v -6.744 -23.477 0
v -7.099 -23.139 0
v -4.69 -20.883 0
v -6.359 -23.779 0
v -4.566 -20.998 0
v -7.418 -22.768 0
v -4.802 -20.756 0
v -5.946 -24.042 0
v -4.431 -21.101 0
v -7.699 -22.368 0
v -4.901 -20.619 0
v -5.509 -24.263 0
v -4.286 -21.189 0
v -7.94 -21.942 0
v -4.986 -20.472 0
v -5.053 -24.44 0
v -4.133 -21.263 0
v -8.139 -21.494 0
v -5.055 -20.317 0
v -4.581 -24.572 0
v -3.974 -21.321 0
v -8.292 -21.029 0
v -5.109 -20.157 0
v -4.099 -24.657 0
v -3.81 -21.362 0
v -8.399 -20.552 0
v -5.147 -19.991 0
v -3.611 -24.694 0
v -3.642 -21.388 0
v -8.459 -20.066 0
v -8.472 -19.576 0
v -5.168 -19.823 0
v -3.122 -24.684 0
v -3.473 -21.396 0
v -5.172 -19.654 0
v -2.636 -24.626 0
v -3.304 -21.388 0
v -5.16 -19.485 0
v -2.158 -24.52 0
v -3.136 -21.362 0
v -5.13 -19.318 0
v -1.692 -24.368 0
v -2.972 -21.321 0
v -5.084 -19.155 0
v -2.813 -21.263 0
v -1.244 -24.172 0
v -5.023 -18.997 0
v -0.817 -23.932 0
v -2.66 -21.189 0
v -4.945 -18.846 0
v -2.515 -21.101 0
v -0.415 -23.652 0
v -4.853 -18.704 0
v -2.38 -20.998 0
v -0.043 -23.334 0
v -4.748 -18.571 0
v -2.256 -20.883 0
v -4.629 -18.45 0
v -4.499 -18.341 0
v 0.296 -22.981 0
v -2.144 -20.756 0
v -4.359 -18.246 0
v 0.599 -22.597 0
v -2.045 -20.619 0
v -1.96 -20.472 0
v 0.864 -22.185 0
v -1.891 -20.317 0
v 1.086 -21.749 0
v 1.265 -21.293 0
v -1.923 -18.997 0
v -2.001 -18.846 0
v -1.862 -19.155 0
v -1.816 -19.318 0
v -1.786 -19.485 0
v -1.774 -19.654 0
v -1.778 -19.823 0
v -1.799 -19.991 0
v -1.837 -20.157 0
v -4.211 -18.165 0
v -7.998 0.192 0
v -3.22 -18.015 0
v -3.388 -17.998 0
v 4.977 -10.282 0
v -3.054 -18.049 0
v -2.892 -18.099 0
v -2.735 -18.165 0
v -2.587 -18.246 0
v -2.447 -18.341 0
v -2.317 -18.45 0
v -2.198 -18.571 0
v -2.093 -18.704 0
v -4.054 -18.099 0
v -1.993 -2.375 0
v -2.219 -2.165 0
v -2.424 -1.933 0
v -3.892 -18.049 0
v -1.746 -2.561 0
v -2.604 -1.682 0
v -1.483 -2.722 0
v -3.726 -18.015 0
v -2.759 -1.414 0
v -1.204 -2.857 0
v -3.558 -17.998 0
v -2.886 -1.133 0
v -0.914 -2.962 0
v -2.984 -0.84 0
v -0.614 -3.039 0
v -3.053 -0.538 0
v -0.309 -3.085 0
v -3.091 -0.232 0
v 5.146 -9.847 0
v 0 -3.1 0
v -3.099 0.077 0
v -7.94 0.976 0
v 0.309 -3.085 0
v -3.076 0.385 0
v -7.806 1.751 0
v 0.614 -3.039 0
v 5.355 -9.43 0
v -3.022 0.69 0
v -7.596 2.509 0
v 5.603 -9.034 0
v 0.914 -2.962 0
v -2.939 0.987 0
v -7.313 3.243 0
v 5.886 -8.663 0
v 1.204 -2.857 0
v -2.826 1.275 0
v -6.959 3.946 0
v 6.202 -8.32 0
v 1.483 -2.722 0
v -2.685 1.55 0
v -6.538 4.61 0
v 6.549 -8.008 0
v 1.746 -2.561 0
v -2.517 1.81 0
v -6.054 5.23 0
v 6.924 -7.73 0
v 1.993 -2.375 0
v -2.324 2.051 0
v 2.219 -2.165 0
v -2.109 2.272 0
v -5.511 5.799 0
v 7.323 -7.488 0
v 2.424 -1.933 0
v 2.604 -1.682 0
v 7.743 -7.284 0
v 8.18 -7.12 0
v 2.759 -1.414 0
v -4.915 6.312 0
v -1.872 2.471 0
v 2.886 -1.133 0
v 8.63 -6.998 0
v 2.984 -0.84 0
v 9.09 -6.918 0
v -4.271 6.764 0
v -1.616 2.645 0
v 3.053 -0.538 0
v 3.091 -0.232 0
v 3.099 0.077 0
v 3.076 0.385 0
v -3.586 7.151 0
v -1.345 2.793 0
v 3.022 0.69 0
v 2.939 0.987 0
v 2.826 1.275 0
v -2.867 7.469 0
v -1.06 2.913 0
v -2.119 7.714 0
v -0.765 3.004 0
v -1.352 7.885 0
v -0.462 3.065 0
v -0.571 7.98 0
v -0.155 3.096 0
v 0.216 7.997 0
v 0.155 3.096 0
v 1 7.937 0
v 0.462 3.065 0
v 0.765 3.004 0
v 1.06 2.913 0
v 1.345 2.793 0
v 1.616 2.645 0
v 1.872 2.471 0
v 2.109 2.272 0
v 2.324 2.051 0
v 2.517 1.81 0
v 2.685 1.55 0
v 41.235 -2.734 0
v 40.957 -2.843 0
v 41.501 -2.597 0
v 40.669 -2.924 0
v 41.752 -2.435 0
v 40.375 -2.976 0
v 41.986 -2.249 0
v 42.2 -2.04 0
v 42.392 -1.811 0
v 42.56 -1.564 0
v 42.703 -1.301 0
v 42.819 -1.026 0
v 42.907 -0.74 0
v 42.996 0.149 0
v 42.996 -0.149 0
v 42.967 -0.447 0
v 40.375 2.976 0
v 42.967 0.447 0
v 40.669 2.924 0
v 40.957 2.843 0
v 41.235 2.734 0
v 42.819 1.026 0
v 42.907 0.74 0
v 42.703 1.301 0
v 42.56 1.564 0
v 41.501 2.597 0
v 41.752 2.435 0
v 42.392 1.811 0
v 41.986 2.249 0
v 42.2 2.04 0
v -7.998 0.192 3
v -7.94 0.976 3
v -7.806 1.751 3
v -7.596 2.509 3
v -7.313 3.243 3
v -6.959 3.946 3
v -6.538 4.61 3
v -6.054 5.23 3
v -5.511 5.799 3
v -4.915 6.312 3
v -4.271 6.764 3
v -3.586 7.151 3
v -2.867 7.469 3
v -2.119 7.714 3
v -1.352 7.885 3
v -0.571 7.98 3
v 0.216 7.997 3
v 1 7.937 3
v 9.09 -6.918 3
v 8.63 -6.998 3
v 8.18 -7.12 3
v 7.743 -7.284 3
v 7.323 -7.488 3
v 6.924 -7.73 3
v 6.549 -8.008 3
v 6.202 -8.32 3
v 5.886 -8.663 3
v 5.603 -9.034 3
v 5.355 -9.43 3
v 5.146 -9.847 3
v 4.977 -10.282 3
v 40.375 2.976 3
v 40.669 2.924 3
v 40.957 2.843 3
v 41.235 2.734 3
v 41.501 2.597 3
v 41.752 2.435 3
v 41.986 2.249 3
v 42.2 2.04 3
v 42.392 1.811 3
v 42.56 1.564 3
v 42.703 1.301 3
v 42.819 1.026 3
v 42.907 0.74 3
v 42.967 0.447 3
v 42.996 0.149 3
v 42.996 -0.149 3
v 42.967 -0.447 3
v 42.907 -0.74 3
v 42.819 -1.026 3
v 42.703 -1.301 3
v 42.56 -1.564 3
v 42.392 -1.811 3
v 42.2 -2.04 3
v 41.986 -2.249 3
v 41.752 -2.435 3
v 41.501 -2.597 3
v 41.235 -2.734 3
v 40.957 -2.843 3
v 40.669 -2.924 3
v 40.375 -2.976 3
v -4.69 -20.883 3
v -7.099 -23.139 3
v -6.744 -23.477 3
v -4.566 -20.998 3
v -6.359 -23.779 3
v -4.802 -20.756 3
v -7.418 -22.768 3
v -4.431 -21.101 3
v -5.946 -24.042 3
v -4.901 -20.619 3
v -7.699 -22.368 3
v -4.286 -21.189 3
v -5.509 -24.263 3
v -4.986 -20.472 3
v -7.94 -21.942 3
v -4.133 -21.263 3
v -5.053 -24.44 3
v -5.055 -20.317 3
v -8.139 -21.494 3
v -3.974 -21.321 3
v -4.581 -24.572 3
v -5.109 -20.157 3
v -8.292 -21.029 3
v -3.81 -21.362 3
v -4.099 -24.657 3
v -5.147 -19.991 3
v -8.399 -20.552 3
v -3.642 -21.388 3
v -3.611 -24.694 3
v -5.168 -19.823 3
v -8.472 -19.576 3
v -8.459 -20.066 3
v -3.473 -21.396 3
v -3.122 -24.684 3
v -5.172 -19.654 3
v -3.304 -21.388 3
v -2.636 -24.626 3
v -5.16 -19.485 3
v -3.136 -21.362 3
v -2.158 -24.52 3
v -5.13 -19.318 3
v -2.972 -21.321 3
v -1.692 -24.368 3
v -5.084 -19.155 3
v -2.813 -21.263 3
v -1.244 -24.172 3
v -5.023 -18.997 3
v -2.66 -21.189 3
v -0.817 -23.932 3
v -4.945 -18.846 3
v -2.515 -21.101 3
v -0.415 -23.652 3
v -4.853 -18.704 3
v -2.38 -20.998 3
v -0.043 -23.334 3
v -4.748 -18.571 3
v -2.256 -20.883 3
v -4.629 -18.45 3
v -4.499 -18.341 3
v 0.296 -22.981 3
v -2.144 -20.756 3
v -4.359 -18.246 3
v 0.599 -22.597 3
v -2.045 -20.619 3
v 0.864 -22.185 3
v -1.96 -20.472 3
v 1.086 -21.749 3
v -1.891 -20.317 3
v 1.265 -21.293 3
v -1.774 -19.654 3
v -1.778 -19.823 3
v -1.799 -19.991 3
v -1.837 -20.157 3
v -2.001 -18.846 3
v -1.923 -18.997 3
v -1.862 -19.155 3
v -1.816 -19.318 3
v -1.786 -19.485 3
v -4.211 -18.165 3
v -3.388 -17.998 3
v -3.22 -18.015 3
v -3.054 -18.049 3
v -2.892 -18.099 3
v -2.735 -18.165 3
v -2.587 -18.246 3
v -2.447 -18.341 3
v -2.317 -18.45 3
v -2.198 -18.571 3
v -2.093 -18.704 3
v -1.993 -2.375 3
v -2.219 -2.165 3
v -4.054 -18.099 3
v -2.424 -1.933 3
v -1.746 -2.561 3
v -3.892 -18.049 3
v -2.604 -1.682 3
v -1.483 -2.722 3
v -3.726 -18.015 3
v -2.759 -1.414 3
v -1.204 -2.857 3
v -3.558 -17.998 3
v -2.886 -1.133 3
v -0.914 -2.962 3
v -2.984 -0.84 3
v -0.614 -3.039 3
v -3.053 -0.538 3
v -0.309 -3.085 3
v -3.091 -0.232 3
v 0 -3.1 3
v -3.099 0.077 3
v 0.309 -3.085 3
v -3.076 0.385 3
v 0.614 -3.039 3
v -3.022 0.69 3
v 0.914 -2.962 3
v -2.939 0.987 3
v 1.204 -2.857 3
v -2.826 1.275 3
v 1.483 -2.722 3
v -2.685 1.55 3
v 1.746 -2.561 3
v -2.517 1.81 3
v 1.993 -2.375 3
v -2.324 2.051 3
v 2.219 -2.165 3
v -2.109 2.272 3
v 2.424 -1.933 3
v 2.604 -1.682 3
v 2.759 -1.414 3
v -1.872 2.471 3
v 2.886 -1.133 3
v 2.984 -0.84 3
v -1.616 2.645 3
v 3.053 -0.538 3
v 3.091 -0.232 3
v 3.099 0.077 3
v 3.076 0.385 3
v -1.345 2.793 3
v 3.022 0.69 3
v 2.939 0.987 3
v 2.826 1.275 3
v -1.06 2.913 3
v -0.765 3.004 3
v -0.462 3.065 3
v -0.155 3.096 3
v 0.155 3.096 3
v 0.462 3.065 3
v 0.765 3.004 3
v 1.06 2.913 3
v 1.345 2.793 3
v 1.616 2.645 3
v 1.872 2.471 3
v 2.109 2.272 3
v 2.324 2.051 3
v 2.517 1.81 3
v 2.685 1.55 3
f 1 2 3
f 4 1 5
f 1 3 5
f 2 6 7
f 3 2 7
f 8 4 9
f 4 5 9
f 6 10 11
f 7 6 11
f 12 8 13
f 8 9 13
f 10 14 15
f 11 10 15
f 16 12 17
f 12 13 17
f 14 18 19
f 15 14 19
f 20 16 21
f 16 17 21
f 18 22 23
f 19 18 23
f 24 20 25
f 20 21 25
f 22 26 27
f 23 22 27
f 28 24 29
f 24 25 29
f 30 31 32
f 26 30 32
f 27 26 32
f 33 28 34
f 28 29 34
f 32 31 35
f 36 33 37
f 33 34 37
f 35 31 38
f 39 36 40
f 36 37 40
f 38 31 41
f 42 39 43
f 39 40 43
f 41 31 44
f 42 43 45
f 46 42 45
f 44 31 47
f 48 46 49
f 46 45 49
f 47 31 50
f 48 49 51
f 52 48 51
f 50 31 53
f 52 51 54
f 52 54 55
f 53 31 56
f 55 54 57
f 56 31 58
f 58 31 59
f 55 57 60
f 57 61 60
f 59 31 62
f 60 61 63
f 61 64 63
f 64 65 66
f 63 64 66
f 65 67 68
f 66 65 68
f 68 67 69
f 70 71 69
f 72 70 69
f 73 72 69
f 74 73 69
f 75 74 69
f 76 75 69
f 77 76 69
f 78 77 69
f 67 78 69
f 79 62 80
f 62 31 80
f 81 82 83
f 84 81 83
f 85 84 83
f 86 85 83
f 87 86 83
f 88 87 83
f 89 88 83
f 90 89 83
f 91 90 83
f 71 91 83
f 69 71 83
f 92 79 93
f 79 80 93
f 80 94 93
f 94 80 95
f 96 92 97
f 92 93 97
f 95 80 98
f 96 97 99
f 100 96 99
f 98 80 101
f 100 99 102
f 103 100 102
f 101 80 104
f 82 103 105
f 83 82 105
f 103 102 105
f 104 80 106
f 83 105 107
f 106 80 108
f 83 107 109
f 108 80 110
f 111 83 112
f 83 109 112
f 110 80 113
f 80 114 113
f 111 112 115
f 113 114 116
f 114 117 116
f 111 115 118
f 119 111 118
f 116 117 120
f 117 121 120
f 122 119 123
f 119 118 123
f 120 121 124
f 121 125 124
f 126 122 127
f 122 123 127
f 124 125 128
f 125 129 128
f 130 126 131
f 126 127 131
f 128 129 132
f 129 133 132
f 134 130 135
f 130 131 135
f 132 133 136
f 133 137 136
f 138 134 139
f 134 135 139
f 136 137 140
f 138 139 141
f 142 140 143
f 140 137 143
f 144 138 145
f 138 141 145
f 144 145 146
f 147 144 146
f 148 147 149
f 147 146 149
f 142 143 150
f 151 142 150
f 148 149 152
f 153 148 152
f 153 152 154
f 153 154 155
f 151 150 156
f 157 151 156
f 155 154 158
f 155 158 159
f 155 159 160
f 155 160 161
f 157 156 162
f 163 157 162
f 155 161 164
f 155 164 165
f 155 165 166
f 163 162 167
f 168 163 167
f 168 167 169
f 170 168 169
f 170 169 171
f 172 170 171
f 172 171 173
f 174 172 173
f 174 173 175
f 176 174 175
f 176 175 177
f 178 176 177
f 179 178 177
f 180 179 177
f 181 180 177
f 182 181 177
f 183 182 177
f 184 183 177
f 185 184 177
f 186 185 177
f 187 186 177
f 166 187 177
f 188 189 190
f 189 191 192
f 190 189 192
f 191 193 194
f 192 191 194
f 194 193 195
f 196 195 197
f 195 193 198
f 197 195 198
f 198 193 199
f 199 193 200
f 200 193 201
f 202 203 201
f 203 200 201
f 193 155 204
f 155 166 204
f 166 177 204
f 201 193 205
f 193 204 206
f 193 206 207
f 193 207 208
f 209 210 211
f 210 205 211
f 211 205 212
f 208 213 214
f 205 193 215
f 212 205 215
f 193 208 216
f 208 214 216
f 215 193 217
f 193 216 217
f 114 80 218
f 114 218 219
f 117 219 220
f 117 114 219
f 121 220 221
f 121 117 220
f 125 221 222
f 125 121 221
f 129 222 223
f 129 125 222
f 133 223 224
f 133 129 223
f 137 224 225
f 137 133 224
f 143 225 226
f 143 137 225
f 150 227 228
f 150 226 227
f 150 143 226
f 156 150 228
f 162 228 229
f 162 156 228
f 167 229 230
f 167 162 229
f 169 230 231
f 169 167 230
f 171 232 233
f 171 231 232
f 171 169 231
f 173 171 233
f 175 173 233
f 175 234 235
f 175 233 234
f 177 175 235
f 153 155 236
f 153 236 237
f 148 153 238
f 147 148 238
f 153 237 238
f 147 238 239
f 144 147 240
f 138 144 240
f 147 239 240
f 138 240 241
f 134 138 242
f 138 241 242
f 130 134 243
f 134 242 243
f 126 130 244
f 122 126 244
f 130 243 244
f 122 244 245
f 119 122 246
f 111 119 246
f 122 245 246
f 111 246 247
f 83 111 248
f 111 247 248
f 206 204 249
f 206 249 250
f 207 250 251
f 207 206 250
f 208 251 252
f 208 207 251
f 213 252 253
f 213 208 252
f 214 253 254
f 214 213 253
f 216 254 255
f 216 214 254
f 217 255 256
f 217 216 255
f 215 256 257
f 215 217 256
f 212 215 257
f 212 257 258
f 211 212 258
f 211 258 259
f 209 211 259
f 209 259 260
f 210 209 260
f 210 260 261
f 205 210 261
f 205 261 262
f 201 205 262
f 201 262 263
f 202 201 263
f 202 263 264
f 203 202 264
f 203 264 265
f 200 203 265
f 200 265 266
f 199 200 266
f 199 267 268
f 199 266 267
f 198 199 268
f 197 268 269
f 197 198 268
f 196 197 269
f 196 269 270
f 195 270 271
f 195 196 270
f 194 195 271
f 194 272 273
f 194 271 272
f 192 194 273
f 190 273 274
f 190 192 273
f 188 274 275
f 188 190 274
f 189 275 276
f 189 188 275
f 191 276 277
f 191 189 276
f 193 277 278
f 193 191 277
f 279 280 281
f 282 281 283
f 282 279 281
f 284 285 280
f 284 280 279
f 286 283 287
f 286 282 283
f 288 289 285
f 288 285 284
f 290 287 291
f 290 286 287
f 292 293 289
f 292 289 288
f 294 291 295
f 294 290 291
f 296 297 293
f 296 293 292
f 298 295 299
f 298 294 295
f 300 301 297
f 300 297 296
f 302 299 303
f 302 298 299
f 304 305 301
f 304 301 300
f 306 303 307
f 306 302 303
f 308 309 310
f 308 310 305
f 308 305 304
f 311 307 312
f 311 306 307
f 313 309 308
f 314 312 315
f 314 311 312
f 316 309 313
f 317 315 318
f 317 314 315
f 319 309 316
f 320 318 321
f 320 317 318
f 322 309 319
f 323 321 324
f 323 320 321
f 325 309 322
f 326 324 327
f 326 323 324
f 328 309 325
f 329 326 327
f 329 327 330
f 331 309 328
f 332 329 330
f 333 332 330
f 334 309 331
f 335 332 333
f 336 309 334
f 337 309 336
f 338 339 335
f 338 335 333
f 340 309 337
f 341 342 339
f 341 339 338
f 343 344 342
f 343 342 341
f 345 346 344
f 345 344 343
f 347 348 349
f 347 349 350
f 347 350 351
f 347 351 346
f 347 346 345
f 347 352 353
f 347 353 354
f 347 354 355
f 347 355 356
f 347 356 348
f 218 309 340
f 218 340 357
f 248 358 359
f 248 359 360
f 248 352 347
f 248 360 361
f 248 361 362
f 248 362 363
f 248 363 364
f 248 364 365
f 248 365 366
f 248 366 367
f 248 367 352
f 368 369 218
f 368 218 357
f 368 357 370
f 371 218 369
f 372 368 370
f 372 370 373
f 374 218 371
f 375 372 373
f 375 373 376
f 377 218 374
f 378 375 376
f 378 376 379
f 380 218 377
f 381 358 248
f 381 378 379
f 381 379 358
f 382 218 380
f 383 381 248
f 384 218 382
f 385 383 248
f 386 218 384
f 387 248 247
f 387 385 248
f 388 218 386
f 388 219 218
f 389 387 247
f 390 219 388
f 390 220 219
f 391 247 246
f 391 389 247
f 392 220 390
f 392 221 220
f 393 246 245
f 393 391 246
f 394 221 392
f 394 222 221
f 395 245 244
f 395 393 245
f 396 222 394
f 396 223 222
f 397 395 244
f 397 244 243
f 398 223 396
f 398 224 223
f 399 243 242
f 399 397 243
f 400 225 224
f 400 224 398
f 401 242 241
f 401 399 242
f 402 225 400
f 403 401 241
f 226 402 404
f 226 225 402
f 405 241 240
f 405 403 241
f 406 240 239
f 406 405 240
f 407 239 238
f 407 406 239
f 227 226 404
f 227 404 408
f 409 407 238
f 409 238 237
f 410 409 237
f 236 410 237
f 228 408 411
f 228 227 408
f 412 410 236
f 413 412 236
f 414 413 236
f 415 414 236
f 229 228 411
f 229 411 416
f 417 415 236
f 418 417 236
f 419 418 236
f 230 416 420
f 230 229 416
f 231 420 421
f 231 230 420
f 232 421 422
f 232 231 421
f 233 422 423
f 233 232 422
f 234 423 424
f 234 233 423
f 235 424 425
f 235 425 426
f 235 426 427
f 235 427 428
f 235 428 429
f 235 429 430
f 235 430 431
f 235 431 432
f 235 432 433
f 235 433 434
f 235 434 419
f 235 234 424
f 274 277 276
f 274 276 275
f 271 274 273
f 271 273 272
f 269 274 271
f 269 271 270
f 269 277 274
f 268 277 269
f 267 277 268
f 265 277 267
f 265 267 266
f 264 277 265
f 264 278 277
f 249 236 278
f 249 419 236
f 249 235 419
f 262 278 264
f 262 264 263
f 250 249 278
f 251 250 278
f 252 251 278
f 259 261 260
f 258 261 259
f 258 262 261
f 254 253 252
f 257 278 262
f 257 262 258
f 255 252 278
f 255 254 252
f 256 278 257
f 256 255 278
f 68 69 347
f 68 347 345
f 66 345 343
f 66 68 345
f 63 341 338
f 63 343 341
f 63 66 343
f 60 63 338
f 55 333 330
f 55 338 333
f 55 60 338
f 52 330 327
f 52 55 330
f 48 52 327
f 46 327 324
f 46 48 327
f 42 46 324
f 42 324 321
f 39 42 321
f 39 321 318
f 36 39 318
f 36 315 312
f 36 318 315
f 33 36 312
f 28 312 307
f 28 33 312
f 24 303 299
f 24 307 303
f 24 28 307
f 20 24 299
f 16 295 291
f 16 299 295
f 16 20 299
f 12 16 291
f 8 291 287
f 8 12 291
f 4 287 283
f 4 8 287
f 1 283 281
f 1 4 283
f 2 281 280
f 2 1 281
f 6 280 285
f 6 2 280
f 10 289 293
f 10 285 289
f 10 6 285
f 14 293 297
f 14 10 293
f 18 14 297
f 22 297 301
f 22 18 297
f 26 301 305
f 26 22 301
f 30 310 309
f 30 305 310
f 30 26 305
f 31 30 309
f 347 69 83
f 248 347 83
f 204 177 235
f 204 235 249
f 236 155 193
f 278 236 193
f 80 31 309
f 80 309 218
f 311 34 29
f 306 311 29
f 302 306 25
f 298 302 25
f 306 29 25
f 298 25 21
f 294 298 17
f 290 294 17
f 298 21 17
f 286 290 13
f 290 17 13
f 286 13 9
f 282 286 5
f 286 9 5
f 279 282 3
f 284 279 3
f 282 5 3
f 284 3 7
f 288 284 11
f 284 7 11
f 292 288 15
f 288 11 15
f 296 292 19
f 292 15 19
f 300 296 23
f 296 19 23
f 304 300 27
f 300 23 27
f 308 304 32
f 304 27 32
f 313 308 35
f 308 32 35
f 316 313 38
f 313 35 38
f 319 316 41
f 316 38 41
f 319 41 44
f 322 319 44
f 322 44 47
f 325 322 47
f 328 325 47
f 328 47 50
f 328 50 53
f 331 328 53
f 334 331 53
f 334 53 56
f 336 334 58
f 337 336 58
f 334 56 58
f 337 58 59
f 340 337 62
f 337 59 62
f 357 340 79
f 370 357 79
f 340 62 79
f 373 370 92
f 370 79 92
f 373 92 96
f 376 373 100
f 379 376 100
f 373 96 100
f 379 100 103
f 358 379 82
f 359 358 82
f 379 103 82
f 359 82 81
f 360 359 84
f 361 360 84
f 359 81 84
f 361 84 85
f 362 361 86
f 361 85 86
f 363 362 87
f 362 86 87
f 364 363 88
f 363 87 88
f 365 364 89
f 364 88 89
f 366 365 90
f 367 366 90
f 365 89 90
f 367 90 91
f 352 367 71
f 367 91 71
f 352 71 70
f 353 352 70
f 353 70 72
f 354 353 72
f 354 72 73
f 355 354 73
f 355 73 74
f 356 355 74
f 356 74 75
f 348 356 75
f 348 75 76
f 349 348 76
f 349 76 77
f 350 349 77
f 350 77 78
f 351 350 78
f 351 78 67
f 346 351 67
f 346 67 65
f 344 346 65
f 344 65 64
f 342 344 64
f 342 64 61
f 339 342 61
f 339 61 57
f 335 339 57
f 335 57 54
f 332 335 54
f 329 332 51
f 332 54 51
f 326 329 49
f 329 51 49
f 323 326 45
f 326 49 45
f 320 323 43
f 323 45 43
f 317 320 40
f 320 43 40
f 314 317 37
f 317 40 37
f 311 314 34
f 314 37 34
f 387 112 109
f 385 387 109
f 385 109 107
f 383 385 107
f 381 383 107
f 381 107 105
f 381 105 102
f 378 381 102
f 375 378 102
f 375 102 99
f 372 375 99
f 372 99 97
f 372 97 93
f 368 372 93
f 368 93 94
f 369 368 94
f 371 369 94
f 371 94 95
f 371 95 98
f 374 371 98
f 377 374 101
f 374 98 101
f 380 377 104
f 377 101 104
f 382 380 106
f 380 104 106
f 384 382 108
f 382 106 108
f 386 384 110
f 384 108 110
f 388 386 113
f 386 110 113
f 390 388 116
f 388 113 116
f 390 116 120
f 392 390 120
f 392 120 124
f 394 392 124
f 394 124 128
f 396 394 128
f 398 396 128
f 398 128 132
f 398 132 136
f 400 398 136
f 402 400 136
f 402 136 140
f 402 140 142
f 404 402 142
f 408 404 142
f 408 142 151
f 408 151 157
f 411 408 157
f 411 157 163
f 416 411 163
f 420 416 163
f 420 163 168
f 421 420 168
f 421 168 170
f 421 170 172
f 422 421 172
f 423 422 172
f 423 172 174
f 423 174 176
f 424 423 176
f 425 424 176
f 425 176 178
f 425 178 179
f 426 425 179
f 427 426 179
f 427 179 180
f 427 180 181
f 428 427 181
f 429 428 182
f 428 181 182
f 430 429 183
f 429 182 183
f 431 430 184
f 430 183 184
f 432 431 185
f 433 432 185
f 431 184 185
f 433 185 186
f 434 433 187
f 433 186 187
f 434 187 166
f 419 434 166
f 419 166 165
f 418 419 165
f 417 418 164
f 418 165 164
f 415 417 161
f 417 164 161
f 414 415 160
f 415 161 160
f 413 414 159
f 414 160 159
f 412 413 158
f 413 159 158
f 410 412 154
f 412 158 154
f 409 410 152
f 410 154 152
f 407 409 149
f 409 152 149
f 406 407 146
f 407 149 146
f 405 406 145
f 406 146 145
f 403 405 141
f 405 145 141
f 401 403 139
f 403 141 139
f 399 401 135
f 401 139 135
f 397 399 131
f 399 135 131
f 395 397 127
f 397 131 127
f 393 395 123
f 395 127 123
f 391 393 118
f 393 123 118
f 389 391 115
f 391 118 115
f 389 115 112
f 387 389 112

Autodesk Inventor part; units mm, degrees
ref_plane "YZ Plane" through (0, 0, 0) normal (1, 0, 0) x (0, 1, 0)
ref_plane "XZ Plane" through (0, 0, 0) normal (0, 1, 0) x (-1, 0, 0)
ref_plane "XY Plane" through (0, 0, 0) normal (0, 0, 1) x (1, 0, 0)
sketch "Sketch1" plane through (0, 0, 0) normal (0, 0, 1) x (1, 0, 0)
  circle A0 centre (0, 0) radius 8
  line L0 (1, 7.9373) -> (40.375, 2.9765)
  line L1 (1, -7.9373) -> (40.375, -2.9765)
  line L2 (0, 0) -> (40, 0) construction
  circle A1 centre (40, 0) radius 3
  circle A2 centre (-3.473, -19.6962) radius 5
  line L3 (1.2651, -21.2932) -> (7.5809, -2.5552)
  line L4 (-8.4715, -19.5763) -> (-7.9977, 0.1917)
  line L5 (0, 0) -> (-3.473, -19.6962) construction
  dimension "d0" = 16
  dimension "d1" = 6
  dimension "d2" = 40
  dimension "d3" = 10
  dimension "d4" = 20
  dimension "d5" = 100
extrude "Extrusion1" add sketch "Sketch1" along normal blind 3
fillet "Fillet1" radius 5 1 edges at (5.9783, -7.31, 1.5)
sketch "Sketch2" plane through (0, 0, 3) normal (0, 0, 1) x (1, 0, 0)
  point P0 (0, 0)
  point P1 (0, 0)
hole "Hole1" at (0, 0, 3) direction (0, 0, -1) diameter 6.2 end through all
sketch "Sketch3" plane through (0, 0, 3) normal (0, 0, 1) x (1, 0, 0)
  arc A0 (-8.4715, -19.5763) -> (1.2651, -21.2932) centre (-3.473, -19.6962) ccw projected
  point P0 (0, 0)
hole "Hole2" at (-3.473, -19.6962, 3) direction (0, 0, -1) diameter 3.4 end through all clearance for "Socket Head Cap Screw" size "M3" standard "Ansi Metric M Profile"
properties part number "Pancake_Lever" material "Nylon 6/6"
